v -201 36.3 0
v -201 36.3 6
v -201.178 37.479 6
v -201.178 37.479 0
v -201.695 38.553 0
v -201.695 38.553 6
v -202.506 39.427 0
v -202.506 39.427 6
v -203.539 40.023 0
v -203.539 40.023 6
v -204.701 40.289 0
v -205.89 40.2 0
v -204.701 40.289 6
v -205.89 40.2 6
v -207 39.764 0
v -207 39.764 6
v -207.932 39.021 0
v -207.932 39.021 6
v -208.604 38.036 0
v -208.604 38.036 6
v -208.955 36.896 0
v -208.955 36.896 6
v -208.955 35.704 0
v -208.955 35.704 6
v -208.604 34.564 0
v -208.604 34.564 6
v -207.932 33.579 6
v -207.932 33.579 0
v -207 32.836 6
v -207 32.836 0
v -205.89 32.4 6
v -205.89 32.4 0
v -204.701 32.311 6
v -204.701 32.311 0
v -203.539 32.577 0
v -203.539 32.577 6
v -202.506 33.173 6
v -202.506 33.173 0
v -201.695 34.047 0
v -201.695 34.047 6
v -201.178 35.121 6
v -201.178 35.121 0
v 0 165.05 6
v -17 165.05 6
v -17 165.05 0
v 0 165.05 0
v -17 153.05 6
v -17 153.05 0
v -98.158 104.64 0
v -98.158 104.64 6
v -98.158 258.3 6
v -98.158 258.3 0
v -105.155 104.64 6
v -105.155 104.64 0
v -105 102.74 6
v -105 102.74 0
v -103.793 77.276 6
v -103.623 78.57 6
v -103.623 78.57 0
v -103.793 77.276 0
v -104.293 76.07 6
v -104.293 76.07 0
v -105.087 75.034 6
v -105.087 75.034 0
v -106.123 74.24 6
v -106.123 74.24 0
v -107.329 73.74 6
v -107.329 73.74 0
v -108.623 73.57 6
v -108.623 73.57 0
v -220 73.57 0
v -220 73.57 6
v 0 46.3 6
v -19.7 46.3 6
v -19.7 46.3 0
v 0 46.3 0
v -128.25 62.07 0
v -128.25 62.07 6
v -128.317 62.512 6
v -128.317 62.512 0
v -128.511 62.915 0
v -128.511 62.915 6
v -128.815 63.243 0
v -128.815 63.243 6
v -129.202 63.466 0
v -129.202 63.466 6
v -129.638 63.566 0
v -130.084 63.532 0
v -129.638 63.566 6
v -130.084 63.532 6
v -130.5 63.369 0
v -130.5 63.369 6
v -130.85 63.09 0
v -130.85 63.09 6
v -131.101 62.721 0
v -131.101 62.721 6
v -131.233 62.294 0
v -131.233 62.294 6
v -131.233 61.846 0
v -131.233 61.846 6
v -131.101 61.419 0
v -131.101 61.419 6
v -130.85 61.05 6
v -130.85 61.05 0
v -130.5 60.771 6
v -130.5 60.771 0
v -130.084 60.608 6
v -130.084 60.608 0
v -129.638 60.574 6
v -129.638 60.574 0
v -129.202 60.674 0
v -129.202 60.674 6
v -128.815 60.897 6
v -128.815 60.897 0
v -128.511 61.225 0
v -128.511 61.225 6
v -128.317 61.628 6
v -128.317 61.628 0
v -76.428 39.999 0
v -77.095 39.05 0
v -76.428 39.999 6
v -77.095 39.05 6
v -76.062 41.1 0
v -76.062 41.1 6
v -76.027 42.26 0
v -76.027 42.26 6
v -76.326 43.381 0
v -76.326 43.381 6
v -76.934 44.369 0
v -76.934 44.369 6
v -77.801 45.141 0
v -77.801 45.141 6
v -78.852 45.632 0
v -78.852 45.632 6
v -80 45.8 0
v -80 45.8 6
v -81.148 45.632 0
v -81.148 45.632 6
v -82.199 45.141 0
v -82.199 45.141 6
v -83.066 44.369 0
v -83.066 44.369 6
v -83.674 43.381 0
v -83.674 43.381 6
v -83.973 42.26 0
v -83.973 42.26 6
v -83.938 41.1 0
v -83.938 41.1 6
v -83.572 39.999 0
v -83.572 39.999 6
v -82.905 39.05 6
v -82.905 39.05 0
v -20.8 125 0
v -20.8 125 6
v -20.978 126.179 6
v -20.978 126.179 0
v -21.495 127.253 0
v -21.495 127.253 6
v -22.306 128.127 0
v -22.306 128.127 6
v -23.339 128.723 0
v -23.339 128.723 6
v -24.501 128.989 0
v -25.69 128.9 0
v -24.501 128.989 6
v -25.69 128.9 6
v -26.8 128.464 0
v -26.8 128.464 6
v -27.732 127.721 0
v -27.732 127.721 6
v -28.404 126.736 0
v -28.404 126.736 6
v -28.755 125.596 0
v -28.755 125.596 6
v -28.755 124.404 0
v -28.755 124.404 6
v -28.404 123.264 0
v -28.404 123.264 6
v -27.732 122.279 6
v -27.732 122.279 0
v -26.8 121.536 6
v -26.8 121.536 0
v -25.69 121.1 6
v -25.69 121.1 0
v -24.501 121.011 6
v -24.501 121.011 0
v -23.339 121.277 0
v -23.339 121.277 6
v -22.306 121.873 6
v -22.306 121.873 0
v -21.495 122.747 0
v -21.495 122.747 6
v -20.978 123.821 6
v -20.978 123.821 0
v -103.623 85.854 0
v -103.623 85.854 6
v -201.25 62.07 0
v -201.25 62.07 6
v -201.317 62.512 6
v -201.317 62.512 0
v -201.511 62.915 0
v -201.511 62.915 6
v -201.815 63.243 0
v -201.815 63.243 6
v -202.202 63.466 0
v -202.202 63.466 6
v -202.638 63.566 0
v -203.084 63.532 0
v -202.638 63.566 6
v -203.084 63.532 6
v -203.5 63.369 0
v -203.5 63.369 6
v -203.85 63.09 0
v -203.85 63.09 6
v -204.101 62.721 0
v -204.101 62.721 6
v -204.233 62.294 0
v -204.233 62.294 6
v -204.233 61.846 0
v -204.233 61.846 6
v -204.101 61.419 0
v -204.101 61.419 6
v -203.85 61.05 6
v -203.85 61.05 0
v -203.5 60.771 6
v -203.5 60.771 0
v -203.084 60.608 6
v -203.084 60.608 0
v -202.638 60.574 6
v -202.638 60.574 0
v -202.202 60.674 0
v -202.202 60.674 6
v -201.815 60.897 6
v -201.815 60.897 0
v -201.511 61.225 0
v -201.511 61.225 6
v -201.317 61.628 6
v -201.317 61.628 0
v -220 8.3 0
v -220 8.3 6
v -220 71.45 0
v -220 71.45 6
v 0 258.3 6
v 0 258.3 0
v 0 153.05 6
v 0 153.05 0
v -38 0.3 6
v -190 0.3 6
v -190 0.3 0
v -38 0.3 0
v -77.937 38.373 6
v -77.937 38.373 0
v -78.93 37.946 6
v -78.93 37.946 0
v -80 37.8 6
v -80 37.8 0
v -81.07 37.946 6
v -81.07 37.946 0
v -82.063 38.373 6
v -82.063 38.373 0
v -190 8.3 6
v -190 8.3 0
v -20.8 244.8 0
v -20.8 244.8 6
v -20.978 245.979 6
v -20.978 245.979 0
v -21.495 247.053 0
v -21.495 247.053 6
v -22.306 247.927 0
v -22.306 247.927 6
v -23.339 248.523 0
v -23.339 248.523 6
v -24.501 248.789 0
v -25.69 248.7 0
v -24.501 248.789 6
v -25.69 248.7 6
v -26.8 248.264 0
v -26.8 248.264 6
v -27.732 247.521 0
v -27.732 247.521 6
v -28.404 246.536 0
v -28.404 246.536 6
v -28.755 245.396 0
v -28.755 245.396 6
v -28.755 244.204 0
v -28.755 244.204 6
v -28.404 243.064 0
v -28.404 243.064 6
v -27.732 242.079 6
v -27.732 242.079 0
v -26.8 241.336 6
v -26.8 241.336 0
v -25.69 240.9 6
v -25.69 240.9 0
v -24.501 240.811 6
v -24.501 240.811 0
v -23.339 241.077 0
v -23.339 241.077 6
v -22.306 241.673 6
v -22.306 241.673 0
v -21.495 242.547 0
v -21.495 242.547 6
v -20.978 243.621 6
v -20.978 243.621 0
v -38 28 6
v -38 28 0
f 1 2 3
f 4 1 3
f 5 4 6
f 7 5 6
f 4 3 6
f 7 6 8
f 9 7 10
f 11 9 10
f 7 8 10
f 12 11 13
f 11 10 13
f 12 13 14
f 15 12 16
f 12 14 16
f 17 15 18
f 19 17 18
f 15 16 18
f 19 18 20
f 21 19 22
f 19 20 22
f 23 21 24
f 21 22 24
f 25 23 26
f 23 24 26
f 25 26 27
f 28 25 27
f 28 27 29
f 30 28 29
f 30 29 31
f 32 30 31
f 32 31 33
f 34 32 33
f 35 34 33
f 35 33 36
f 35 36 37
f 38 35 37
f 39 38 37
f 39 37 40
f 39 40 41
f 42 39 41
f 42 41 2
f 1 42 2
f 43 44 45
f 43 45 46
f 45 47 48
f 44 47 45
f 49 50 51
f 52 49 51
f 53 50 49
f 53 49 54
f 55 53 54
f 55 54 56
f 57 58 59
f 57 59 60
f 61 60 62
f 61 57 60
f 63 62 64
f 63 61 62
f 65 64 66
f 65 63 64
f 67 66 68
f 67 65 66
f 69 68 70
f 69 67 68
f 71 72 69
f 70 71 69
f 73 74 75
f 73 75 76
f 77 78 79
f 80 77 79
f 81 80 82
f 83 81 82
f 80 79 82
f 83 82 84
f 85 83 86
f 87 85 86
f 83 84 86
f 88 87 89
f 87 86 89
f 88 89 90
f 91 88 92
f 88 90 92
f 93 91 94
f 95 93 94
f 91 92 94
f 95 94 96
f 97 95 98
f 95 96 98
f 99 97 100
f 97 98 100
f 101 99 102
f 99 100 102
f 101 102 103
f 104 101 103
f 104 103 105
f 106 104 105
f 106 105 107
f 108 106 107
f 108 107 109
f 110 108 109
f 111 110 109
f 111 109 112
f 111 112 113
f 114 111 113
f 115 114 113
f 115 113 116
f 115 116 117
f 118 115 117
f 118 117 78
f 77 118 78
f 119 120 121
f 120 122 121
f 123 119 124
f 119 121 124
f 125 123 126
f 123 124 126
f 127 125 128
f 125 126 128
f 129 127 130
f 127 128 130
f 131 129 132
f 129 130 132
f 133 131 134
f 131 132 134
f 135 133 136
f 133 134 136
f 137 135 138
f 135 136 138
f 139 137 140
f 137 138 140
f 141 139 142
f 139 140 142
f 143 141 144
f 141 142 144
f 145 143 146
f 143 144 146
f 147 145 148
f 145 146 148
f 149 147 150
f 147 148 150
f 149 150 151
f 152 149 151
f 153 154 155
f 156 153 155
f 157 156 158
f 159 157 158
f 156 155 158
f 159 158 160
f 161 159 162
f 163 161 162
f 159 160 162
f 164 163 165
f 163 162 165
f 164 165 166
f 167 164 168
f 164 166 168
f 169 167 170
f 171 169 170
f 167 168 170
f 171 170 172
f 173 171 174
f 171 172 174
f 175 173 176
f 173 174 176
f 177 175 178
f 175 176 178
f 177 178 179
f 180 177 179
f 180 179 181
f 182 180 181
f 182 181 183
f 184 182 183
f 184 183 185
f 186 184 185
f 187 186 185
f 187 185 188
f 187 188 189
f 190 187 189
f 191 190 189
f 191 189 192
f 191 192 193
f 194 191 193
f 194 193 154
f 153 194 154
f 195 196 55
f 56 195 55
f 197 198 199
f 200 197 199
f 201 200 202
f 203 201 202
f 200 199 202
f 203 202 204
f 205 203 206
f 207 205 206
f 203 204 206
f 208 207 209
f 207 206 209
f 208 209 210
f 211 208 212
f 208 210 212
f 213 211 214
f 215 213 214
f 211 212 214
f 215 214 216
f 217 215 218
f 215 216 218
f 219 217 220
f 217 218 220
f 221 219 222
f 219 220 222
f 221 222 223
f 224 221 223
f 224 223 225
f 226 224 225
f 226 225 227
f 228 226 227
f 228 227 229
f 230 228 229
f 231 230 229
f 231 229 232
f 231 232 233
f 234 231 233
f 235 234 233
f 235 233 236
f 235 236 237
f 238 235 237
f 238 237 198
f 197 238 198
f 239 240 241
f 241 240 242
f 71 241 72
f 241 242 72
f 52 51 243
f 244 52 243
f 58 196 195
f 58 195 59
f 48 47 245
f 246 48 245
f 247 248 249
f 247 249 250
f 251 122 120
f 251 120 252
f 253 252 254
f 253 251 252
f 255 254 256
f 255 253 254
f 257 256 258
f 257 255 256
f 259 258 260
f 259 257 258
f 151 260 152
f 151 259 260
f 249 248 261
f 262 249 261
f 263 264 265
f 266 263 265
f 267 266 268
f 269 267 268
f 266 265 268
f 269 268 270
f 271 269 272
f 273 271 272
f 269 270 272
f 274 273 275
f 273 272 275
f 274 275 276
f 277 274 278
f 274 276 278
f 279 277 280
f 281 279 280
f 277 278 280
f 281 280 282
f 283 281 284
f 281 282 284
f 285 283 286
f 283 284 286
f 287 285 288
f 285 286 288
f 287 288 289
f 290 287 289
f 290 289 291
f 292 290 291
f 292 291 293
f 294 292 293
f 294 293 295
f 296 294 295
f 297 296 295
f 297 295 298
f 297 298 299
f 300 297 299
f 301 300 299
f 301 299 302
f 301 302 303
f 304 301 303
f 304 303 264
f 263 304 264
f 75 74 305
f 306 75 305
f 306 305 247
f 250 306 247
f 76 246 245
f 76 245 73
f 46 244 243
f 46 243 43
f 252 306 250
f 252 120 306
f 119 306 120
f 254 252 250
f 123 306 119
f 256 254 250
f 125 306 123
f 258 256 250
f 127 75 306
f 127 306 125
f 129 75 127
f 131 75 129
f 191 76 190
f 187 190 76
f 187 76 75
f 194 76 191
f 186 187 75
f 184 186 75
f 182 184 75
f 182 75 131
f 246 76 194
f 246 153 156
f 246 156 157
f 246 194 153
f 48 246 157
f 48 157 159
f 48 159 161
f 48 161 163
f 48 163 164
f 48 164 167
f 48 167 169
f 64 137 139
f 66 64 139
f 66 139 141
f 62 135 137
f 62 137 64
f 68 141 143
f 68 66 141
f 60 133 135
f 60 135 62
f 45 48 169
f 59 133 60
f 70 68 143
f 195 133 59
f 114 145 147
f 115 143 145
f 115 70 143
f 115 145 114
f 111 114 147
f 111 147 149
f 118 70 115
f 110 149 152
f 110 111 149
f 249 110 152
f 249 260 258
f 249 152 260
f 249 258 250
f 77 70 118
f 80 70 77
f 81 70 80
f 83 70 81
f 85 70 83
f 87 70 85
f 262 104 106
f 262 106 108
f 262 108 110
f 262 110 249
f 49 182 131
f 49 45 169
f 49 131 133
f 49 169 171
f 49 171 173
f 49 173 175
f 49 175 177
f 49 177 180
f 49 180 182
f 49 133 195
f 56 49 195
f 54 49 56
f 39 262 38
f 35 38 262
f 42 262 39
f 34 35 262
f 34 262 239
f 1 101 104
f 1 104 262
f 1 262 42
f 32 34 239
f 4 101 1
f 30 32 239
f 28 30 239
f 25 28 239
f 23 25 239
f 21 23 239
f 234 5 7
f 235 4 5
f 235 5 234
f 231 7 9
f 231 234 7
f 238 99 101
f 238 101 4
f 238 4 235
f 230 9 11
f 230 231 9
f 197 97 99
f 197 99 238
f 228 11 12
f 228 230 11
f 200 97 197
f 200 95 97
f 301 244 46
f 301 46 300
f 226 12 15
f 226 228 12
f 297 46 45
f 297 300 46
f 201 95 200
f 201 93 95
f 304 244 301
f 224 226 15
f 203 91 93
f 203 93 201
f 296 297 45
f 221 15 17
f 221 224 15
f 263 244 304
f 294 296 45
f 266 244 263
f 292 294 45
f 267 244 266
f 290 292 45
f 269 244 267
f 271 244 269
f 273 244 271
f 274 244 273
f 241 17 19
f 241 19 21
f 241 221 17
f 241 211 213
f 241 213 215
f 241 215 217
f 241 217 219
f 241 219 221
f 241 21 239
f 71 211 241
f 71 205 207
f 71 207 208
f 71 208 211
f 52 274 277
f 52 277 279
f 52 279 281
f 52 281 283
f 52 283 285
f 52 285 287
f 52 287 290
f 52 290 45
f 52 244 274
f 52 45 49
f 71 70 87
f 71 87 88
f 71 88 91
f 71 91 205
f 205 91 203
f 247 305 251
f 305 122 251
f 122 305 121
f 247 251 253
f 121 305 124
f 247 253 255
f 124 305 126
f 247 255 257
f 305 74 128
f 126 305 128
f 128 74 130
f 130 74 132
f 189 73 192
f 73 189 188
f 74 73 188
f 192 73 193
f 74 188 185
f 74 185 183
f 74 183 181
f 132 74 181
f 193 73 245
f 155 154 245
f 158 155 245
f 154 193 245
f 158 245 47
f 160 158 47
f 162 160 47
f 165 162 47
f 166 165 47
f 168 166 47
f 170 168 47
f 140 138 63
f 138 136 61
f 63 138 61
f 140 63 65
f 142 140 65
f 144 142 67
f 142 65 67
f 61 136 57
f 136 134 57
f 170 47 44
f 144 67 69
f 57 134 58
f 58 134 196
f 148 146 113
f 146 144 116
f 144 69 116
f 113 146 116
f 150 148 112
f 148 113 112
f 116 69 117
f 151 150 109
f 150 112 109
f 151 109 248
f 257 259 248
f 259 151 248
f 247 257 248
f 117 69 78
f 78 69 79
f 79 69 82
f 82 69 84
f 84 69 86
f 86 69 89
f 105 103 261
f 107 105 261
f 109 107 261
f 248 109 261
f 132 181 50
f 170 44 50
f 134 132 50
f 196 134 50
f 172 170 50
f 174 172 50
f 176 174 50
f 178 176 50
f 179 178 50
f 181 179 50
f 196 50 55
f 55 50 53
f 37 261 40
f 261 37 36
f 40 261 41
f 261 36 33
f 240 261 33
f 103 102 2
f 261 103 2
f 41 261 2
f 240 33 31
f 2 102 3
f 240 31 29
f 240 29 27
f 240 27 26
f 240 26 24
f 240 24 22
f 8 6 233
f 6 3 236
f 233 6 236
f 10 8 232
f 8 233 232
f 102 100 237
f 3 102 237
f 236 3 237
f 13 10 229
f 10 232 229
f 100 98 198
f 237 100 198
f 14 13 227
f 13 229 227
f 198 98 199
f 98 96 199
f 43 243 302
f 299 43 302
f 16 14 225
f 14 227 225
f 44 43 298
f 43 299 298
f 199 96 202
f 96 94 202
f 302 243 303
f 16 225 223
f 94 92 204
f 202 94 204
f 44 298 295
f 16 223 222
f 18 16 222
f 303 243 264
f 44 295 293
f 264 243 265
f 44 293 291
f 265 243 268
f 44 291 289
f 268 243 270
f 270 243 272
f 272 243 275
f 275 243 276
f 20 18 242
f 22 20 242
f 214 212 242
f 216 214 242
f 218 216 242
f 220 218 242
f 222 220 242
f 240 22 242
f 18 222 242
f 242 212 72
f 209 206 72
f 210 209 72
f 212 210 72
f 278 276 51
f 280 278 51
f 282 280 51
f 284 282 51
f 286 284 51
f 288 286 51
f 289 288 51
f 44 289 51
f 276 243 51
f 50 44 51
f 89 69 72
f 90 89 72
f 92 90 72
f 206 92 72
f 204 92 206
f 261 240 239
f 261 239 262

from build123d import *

# Parameters (mm, degrees)
BOSS_EXTRUDE2_DEPTH      = 6
SKETCH2_R                = 4
SKETCH2_W                = 30
SKETCH2_H                = 8.3
CUT_EXTRUDE1_DEPTH       = 341.487943986
CROQUIS1_W               = 103.610606389
CROQUIS1_H               = 1.56
SALIENTE_EXTRUIR2_DEPTH  = 6
SALIENTE_EXTRUIR3_DEPTH  = 6
SALIENTE_EXTRUIR4_START  = -6
SALIENTE_EXTRUIR4_DEPTH  = 6
SALIENTE_EXTRUIR5_DEPTH  = 6
SALIENTE_EXTRUIR6_DEPTH  = 6
CROQUIS7_W               = 103.610606389
CROQUIS7_H               = 0.56
SALIENTE_EXTRUIR7_DEPTH  = 6
SALIENTE_EXTRUIR8_DEPTH  = 6
SKETCH3_R                = 1.5
CUT_EXTRUDE2_DEPTH       = 341.487943986
CUT_EXTRUDE3_DEPTH       = 341.487943986
CROQUIS9_W               = 152
CROQUIS9_H               = 0.3
CORTAR_EXTRUIR1_DEPTH    = 10
CORTAR_EXTRUIR2_DEPTH    = 6
CROQUIS14_W              = 17
CROQUIS14_H              = 12
CORTAR_EXTRUIR4_DEPTH    = 10
CROQUIS15_R              = 4
CORTAR_EXTRUIR5_DEPTH    = 10
SALIENTE_EXTRUIR10_DEPTH = 6
SALIENTE_EXTRUIR11_DEPTH = 6
CROQUIS18_W              = 98.157526679
CROQUIS18_H              = 1.5
CORTAR_EXTRUIR6_DEPTH    = 6


with BuildPart() as part:
    # Sketch1 → Boss-Extrude2 (new body)
    with BuildSketch(Plane.XY):
        with BuildLine():
            Line((0, 0), (-220, 0))
            Line((-220, 0), (-220, 71.45))
            Line((-220, 71.45), (-116.389393611, 71.45))
            ThreePointArc((-116.389393611, 71.45), (-107.149394721, 74.662079518), (-101.894274329, 82.913063942))
            Line((-101.894274329, 82.913063942), (-60, 259.8))
            Line((-60, 259.8), (0, 259.8))
            Line((0, 259.8), (0, 0))
        make_face()
    extrude(amount=BOSS_EXTRUDE2_DEPTH)

    # Sketch2 → Cut-Extrude1 (cut, through all)
    with BuildSketch(Plane.XY.offset(6)):
        with Locations((-205, 36.3)):
            Circle(SKETCH2_R)
        with Locations((-24.8, 244.8)):
            Circle(SKETCH2_R)
        with Locations((-24.8, 125)):
            Circle(SKETCH2_R)
        with Locations((-80, 36.3)):
            Circle(SKETCH2_R)
        with Locations((-205, 4.15)):
            Rectangle(SKETCH2_W, SKETCH2_H)
        Polygon((-38, 0), (-38, 19), (-10.7, 46.3), (0, 46.3), (0, 0), align=None)
    extrude(amount=-CUT_EXTRUDE1_DEPTH, mode=Mode.SUBTRACT)

    # Croquis1 → Saliente-Extruir2 (add)
    with BuildSketch(Plane.XY.offset(6)):
        with Locations((-168.194696806, 72.23)):
            Rectangle(CROQUIS1_W, CROQUIS1_H)
    extrude(amount=-SALIENTE_EXTRUIR2_DEPTH)

    # Croquis3 → Saliente-Extruir3 (add)
    with BuildSketch(Plane.XY.offset(6)):
        Polygon((-101.894274329, 82.913063942), (-103.412279578, 83.272591501), (-60, 259.8), align=None)
    extrude(amount=-SALIENTE_EXTRUIR3_DEPTH)

    # Croquis4 → Saliente-Extruir4 (add)
    with BuildSketch(Plane.XY.offset(6).offset(SALIENTE_EXTRUIR4_START)):
        with BuildLine():
            Line((-103.412279578, 83.272591501), (-101.894274329, 82.913063942))
            ThreePointArc((-101.894274329, 82.913063942), (-107.149394721, 74.662079518), (-116.389393611, 71.45))
            Line((-116.389393611, 71.45), (-116.389393611, 73.01))
            ThreePointArc((-116.389393611, 73.01), (-108.117056079, 75.88569363), (-103.412279578, 83.272591501))
        make_face()
    extrude(amount=SALIENTE_EXTRUIR4_DEPTH)

    # Croquis5 → Saliente-Extruir5 (add)
    with BuildSketch(Plane.XY.offset(6)):
        Polygon((-105, 102.74), (-55, 102.74), (-103.412279578, 83.272591501), align=None)
    extrude(amount=-SALIENTE_EXTRUIR5_DEPTH)

    # Croquis6 → Saliente-Extruir6 (add)
    with BuildSketch(Plane.XY.offset(6)):
        Polygon((-98.157526679, 104.64), (-105.154959958, 104.64), (-105, 102.74), (-98.624781775, 102.74), align=None)
    extrude(amount=-SALIENTE_EXTRUIR6_DEPTH)

    # Croquis7 → Saliente-Extruir7 (add)
    with BuildSketch(Plane.XY.offset(6)):
        with Locations((-168.194696806, 73.29)):
            Rectangle(CROQUIS7_W, CROQUIS7_H)
    extrude(amount=-SALIENTE_EXTRUIR7_DEPTH)

    # Croquis8 → Saliente-Extruir8 (add)
    with BuildSketch(Plane.XY.offset(6)):
        with BuildLine():
            Line((-116.389393611, 73.57), (-117.98880457, 71.652693326))
            Line((-117.98880457, 71.652693326), (-105.380568296, 73.057716723))
            Line((-105.380568296, 73.057716723), (-100.684832206, 83.373546401))
            Line((-100.684832206, 83.373546401), (-103.622774874, 85.853523162))
            ThreePointArc((-103.622774874, 85.853523162), (-107.531184208, 77.13952683), (-116.389393611, 73.57))
        make_face()
    extrude(amount=-SALIENTE_EXTRUIR8_DEPTH)

    # Sketch3 → Cut-Extrude2 (cut, through all)
    with BuildSketch(Plane.XY.offset(6)):
        with Locations((-202.75, 62.07)):
            Circle(SKETCH3_R)
        with Locations((-129.75, 62.07)):
            Circle(SKETCH3_R)
    extrude(amount=-CUT_EXTRUDE2_DEPTH, mode=Mode.SUBTRACT)

    # Sketch4 → Cut-Extrude3 (cut, through all)
    with BuildSketch(Plane.XY.offset(6)):
        with BuildLine():
            Line((-103.622774874, 85.853523162), (-103.622774874, 78.57))
            ThreePointArc((-103.622774874, 78.57), (-105.087240968, 75.034466094), (-108.622774874, 73.57))
            Line((-108.622774874, 73.57), (-116.389393611, 73.57))
            ThreePointArc((-116.389393611, 73.57), (-107.531184208, 77.13952683), (-103.622774874, 85.853523162))
        make_face()
    extrude(amount=-CUT_EXTRUDE3_DEPTH, mode=Mode.SUBTRACT)

    # Croquis9 → Cortar-Extruir1 (cut)
    with BuildSketch(Plane.XY.offset(6)):
        with Locations((-114, 0.15)):
            Rectangle(CROQUIS9_W, CROQUIS9_H)
    extrude(amount=-CORTAR_EXTRUIR1_DEPTH, mode=Mode.SUBTRACT)

    # Croquis11 → Cortar-Extruir2 (cut)
    with BuildSketch(Plane.XY.offset(6)):
        Polygon((-10.7, 46.3), (-19.7, 46.3), (-38, 28), (-38, 19), align=None)
    extrude(amount=-CORTAR_EXTRUIR2_DEPTH, mode=Mode.SUBTRACT)

    # Croquis14 → Cortar-Extruir4 (cut)
    with BuildSketch(Plane.XY.offset(6)):
        with Locations((-8.5, 159.05)):
            Rectangle(CROQUIS14_W, CROQUIS14_H)
    extrude(amount=-CORTAR_EXTRUIR4_DEPTH, mode=Mode.SUBTRACT)

    # Croquis15 → Cortar-Extruir5 (cut)
    with BuildSketch(Plane.XY.offset(6)):
        with Locations((-80, 41.8)):
            Circle(CROQUIS15_R)
    extrude(amount=-CORTAR_EXTRUIR5_DEPTH, mode=Mode.SUBTRACT)

    # Croquis16 → Saliente-Extruir10 (add)
    with BuildSketch(Plane.XY.offset(6)):
        with BuildLine():
            ThreePointArc((-77.09526249, 39.05), (-80, 37.8), (-82.90473751, 39.05))
            ThreePointArc((-82.90473751, 39.05), (-80, 32.3), (-77.09526249, 39.05))
        make_face()
    extrude(amount=-SALIENTE_EXTRUIR10_DEPTH)

    # Croquis17 → Saliente-Extruir11 (add)
    with BuildSketch(Plane.XY.offset(6)):
        Polygon((-98.157526679, 104.64), (-98.157526679, 259.8), (-60, 259.8), align=None)
    extrude(amount=-SALIENTE_EXTRUIR11_DEPTH)

    # Croquis18 → Cortar-Extruir6 (cut)
    with BuildSketch(Plane.XY.offset(6)):
        with Locations((-49.07876334, 259.05)):
            Rectangle(CROQUIS18_W, CROQUIS18_H)
    extrude(amount=-CORTAR_EXTRUIR6_DEPTH, mode=Mode.SUBTRACT)


solid = part.part
